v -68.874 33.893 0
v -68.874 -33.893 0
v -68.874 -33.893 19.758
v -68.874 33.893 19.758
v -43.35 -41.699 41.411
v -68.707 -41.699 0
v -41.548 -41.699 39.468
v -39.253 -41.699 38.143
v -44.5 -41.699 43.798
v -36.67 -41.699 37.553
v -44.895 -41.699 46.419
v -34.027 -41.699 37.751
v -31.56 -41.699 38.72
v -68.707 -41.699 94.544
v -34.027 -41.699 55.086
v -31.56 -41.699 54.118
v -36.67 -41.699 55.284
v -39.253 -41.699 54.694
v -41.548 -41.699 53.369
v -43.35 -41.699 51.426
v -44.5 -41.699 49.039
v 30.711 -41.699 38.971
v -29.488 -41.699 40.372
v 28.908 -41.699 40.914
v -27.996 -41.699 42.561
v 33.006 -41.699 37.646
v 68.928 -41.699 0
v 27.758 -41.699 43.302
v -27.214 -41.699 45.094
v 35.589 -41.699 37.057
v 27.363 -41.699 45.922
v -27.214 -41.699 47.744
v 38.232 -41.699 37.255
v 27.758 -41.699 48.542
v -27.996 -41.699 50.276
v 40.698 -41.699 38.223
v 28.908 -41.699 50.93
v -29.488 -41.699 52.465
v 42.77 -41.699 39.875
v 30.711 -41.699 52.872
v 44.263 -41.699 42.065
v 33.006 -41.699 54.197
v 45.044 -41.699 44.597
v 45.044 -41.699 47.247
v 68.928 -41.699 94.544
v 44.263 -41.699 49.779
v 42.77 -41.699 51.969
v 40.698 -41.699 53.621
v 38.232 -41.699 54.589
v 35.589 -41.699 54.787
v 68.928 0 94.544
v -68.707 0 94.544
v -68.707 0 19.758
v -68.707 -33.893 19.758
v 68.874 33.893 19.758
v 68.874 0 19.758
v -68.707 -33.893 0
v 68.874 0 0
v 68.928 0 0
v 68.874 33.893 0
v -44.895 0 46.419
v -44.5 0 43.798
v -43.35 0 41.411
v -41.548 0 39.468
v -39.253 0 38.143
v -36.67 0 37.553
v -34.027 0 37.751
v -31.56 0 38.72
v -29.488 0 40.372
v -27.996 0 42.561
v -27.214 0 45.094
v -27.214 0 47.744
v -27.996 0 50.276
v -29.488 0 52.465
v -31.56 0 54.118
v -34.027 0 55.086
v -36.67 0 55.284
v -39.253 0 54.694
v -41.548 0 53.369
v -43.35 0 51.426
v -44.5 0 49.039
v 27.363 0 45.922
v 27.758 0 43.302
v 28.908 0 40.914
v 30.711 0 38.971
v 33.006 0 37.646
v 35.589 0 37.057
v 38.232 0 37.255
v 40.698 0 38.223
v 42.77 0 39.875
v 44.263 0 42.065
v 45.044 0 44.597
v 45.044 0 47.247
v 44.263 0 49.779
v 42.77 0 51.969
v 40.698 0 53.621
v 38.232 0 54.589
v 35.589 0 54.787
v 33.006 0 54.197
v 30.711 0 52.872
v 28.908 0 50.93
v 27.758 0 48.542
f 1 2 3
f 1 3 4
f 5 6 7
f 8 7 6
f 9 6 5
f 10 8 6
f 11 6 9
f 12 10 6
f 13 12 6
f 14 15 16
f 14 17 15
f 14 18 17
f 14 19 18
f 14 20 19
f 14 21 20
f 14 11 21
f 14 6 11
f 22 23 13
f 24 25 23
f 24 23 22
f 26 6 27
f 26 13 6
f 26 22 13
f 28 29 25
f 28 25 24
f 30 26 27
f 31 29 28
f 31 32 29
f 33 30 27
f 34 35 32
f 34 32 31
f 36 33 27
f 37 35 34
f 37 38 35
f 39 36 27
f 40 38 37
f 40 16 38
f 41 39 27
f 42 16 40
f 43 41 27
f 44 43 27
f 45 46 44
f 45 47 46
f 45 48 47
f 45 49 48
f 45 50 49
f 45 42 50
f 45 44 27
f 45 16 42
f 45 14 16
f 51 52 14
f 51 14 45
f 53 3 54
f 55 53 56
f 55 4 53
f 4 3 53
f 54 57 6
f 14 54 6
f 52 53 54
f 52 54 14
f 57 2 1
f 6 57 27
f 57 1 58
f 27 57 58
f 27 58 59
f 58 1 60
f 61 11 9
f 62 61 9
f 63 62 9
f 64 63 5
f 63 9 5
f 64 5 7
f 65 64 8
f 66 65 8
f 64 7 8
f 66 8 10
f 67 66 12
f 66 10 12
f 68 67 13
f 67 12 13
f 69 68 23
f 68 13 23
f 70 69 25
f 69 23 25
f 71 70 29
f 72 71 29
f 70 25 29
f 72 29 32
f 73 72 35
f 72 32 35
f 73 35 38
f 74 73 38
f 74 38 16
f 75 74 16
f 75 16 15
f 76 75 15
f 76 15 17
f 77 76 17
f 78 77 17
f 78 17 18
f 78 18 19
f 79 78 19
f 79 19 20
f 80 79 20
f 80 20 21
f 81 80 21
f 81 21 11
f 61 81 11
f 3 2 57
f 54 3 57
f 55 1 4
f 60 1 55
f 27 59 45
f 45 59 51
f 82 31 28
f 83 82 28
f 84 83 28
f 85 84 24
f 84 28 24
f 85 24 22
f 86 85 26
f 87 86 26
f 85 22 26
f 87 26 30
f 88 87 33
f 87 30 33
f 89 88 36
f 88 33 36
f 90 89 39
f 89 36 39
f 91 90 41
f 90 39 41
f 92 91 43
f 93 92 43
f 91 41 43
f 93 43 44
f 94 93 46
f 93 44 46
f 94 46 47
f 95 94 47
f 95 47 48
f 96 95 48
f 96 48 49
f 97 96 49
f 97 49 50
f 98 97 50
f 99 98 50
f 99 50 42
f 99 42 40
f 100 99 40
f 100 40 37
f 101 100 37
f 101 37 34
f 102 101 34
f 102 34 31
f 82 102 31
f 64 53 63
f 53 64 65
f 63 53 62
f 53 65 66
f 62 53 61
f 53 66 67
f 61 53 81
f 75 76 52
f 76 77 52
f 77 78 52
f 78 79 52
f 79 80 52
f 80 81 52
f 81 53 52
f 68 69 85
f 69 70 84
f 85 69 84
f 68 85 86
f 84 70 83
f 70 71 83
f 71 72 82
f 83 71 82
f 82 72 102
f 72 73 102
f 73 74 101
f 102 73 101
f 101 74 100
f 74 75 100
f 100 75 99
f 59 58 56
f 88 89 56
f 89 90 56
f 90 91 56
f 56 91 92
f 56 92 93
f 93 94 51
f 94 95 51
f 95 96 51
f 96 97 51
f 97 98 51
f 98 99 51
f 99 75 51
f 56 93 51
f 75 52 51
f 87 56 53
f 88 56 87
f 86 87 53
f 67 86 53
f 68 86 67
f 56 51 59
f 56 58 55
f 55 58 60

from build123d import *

# Parameters (mm, degrees)
F0_W     = 137.7488821745
F0_H     = 67.785397172
F2_DEPTH = 19.75811
F1_W     = 137.6349329948
F1_H     = 94.5436730981
F3_DEPTH = 41.69879
F5_D     = 17.78


with BuildPart() as f2:
    # F0 (on Top) → F2 (new body)
    with BuildSketch(Plane.XY):
        Rectangle(F0_W, F0_H)
    extrude(amount=F2_DEPTH)

    # F1 (on Front) → F3 (join)
    with BuildSketch(Plane.XZ):
        with Locations((0.1108199358, 47.271836549)):
            Rectangle(F1_W, F1_H)
    extrude(amount=F3_DEPTH)

    # F5 (through all)
    with Locations(Plane(origin=(0, 0, 0), x_dir=(1, 0, 0), z_dir=(0, 1, 0))):
        with Locations((-36.0051579773, -46.4185513556), (36.2534709275, -45.9219291806)):
            Hole(F5_D / 2)


solid = f2.part
